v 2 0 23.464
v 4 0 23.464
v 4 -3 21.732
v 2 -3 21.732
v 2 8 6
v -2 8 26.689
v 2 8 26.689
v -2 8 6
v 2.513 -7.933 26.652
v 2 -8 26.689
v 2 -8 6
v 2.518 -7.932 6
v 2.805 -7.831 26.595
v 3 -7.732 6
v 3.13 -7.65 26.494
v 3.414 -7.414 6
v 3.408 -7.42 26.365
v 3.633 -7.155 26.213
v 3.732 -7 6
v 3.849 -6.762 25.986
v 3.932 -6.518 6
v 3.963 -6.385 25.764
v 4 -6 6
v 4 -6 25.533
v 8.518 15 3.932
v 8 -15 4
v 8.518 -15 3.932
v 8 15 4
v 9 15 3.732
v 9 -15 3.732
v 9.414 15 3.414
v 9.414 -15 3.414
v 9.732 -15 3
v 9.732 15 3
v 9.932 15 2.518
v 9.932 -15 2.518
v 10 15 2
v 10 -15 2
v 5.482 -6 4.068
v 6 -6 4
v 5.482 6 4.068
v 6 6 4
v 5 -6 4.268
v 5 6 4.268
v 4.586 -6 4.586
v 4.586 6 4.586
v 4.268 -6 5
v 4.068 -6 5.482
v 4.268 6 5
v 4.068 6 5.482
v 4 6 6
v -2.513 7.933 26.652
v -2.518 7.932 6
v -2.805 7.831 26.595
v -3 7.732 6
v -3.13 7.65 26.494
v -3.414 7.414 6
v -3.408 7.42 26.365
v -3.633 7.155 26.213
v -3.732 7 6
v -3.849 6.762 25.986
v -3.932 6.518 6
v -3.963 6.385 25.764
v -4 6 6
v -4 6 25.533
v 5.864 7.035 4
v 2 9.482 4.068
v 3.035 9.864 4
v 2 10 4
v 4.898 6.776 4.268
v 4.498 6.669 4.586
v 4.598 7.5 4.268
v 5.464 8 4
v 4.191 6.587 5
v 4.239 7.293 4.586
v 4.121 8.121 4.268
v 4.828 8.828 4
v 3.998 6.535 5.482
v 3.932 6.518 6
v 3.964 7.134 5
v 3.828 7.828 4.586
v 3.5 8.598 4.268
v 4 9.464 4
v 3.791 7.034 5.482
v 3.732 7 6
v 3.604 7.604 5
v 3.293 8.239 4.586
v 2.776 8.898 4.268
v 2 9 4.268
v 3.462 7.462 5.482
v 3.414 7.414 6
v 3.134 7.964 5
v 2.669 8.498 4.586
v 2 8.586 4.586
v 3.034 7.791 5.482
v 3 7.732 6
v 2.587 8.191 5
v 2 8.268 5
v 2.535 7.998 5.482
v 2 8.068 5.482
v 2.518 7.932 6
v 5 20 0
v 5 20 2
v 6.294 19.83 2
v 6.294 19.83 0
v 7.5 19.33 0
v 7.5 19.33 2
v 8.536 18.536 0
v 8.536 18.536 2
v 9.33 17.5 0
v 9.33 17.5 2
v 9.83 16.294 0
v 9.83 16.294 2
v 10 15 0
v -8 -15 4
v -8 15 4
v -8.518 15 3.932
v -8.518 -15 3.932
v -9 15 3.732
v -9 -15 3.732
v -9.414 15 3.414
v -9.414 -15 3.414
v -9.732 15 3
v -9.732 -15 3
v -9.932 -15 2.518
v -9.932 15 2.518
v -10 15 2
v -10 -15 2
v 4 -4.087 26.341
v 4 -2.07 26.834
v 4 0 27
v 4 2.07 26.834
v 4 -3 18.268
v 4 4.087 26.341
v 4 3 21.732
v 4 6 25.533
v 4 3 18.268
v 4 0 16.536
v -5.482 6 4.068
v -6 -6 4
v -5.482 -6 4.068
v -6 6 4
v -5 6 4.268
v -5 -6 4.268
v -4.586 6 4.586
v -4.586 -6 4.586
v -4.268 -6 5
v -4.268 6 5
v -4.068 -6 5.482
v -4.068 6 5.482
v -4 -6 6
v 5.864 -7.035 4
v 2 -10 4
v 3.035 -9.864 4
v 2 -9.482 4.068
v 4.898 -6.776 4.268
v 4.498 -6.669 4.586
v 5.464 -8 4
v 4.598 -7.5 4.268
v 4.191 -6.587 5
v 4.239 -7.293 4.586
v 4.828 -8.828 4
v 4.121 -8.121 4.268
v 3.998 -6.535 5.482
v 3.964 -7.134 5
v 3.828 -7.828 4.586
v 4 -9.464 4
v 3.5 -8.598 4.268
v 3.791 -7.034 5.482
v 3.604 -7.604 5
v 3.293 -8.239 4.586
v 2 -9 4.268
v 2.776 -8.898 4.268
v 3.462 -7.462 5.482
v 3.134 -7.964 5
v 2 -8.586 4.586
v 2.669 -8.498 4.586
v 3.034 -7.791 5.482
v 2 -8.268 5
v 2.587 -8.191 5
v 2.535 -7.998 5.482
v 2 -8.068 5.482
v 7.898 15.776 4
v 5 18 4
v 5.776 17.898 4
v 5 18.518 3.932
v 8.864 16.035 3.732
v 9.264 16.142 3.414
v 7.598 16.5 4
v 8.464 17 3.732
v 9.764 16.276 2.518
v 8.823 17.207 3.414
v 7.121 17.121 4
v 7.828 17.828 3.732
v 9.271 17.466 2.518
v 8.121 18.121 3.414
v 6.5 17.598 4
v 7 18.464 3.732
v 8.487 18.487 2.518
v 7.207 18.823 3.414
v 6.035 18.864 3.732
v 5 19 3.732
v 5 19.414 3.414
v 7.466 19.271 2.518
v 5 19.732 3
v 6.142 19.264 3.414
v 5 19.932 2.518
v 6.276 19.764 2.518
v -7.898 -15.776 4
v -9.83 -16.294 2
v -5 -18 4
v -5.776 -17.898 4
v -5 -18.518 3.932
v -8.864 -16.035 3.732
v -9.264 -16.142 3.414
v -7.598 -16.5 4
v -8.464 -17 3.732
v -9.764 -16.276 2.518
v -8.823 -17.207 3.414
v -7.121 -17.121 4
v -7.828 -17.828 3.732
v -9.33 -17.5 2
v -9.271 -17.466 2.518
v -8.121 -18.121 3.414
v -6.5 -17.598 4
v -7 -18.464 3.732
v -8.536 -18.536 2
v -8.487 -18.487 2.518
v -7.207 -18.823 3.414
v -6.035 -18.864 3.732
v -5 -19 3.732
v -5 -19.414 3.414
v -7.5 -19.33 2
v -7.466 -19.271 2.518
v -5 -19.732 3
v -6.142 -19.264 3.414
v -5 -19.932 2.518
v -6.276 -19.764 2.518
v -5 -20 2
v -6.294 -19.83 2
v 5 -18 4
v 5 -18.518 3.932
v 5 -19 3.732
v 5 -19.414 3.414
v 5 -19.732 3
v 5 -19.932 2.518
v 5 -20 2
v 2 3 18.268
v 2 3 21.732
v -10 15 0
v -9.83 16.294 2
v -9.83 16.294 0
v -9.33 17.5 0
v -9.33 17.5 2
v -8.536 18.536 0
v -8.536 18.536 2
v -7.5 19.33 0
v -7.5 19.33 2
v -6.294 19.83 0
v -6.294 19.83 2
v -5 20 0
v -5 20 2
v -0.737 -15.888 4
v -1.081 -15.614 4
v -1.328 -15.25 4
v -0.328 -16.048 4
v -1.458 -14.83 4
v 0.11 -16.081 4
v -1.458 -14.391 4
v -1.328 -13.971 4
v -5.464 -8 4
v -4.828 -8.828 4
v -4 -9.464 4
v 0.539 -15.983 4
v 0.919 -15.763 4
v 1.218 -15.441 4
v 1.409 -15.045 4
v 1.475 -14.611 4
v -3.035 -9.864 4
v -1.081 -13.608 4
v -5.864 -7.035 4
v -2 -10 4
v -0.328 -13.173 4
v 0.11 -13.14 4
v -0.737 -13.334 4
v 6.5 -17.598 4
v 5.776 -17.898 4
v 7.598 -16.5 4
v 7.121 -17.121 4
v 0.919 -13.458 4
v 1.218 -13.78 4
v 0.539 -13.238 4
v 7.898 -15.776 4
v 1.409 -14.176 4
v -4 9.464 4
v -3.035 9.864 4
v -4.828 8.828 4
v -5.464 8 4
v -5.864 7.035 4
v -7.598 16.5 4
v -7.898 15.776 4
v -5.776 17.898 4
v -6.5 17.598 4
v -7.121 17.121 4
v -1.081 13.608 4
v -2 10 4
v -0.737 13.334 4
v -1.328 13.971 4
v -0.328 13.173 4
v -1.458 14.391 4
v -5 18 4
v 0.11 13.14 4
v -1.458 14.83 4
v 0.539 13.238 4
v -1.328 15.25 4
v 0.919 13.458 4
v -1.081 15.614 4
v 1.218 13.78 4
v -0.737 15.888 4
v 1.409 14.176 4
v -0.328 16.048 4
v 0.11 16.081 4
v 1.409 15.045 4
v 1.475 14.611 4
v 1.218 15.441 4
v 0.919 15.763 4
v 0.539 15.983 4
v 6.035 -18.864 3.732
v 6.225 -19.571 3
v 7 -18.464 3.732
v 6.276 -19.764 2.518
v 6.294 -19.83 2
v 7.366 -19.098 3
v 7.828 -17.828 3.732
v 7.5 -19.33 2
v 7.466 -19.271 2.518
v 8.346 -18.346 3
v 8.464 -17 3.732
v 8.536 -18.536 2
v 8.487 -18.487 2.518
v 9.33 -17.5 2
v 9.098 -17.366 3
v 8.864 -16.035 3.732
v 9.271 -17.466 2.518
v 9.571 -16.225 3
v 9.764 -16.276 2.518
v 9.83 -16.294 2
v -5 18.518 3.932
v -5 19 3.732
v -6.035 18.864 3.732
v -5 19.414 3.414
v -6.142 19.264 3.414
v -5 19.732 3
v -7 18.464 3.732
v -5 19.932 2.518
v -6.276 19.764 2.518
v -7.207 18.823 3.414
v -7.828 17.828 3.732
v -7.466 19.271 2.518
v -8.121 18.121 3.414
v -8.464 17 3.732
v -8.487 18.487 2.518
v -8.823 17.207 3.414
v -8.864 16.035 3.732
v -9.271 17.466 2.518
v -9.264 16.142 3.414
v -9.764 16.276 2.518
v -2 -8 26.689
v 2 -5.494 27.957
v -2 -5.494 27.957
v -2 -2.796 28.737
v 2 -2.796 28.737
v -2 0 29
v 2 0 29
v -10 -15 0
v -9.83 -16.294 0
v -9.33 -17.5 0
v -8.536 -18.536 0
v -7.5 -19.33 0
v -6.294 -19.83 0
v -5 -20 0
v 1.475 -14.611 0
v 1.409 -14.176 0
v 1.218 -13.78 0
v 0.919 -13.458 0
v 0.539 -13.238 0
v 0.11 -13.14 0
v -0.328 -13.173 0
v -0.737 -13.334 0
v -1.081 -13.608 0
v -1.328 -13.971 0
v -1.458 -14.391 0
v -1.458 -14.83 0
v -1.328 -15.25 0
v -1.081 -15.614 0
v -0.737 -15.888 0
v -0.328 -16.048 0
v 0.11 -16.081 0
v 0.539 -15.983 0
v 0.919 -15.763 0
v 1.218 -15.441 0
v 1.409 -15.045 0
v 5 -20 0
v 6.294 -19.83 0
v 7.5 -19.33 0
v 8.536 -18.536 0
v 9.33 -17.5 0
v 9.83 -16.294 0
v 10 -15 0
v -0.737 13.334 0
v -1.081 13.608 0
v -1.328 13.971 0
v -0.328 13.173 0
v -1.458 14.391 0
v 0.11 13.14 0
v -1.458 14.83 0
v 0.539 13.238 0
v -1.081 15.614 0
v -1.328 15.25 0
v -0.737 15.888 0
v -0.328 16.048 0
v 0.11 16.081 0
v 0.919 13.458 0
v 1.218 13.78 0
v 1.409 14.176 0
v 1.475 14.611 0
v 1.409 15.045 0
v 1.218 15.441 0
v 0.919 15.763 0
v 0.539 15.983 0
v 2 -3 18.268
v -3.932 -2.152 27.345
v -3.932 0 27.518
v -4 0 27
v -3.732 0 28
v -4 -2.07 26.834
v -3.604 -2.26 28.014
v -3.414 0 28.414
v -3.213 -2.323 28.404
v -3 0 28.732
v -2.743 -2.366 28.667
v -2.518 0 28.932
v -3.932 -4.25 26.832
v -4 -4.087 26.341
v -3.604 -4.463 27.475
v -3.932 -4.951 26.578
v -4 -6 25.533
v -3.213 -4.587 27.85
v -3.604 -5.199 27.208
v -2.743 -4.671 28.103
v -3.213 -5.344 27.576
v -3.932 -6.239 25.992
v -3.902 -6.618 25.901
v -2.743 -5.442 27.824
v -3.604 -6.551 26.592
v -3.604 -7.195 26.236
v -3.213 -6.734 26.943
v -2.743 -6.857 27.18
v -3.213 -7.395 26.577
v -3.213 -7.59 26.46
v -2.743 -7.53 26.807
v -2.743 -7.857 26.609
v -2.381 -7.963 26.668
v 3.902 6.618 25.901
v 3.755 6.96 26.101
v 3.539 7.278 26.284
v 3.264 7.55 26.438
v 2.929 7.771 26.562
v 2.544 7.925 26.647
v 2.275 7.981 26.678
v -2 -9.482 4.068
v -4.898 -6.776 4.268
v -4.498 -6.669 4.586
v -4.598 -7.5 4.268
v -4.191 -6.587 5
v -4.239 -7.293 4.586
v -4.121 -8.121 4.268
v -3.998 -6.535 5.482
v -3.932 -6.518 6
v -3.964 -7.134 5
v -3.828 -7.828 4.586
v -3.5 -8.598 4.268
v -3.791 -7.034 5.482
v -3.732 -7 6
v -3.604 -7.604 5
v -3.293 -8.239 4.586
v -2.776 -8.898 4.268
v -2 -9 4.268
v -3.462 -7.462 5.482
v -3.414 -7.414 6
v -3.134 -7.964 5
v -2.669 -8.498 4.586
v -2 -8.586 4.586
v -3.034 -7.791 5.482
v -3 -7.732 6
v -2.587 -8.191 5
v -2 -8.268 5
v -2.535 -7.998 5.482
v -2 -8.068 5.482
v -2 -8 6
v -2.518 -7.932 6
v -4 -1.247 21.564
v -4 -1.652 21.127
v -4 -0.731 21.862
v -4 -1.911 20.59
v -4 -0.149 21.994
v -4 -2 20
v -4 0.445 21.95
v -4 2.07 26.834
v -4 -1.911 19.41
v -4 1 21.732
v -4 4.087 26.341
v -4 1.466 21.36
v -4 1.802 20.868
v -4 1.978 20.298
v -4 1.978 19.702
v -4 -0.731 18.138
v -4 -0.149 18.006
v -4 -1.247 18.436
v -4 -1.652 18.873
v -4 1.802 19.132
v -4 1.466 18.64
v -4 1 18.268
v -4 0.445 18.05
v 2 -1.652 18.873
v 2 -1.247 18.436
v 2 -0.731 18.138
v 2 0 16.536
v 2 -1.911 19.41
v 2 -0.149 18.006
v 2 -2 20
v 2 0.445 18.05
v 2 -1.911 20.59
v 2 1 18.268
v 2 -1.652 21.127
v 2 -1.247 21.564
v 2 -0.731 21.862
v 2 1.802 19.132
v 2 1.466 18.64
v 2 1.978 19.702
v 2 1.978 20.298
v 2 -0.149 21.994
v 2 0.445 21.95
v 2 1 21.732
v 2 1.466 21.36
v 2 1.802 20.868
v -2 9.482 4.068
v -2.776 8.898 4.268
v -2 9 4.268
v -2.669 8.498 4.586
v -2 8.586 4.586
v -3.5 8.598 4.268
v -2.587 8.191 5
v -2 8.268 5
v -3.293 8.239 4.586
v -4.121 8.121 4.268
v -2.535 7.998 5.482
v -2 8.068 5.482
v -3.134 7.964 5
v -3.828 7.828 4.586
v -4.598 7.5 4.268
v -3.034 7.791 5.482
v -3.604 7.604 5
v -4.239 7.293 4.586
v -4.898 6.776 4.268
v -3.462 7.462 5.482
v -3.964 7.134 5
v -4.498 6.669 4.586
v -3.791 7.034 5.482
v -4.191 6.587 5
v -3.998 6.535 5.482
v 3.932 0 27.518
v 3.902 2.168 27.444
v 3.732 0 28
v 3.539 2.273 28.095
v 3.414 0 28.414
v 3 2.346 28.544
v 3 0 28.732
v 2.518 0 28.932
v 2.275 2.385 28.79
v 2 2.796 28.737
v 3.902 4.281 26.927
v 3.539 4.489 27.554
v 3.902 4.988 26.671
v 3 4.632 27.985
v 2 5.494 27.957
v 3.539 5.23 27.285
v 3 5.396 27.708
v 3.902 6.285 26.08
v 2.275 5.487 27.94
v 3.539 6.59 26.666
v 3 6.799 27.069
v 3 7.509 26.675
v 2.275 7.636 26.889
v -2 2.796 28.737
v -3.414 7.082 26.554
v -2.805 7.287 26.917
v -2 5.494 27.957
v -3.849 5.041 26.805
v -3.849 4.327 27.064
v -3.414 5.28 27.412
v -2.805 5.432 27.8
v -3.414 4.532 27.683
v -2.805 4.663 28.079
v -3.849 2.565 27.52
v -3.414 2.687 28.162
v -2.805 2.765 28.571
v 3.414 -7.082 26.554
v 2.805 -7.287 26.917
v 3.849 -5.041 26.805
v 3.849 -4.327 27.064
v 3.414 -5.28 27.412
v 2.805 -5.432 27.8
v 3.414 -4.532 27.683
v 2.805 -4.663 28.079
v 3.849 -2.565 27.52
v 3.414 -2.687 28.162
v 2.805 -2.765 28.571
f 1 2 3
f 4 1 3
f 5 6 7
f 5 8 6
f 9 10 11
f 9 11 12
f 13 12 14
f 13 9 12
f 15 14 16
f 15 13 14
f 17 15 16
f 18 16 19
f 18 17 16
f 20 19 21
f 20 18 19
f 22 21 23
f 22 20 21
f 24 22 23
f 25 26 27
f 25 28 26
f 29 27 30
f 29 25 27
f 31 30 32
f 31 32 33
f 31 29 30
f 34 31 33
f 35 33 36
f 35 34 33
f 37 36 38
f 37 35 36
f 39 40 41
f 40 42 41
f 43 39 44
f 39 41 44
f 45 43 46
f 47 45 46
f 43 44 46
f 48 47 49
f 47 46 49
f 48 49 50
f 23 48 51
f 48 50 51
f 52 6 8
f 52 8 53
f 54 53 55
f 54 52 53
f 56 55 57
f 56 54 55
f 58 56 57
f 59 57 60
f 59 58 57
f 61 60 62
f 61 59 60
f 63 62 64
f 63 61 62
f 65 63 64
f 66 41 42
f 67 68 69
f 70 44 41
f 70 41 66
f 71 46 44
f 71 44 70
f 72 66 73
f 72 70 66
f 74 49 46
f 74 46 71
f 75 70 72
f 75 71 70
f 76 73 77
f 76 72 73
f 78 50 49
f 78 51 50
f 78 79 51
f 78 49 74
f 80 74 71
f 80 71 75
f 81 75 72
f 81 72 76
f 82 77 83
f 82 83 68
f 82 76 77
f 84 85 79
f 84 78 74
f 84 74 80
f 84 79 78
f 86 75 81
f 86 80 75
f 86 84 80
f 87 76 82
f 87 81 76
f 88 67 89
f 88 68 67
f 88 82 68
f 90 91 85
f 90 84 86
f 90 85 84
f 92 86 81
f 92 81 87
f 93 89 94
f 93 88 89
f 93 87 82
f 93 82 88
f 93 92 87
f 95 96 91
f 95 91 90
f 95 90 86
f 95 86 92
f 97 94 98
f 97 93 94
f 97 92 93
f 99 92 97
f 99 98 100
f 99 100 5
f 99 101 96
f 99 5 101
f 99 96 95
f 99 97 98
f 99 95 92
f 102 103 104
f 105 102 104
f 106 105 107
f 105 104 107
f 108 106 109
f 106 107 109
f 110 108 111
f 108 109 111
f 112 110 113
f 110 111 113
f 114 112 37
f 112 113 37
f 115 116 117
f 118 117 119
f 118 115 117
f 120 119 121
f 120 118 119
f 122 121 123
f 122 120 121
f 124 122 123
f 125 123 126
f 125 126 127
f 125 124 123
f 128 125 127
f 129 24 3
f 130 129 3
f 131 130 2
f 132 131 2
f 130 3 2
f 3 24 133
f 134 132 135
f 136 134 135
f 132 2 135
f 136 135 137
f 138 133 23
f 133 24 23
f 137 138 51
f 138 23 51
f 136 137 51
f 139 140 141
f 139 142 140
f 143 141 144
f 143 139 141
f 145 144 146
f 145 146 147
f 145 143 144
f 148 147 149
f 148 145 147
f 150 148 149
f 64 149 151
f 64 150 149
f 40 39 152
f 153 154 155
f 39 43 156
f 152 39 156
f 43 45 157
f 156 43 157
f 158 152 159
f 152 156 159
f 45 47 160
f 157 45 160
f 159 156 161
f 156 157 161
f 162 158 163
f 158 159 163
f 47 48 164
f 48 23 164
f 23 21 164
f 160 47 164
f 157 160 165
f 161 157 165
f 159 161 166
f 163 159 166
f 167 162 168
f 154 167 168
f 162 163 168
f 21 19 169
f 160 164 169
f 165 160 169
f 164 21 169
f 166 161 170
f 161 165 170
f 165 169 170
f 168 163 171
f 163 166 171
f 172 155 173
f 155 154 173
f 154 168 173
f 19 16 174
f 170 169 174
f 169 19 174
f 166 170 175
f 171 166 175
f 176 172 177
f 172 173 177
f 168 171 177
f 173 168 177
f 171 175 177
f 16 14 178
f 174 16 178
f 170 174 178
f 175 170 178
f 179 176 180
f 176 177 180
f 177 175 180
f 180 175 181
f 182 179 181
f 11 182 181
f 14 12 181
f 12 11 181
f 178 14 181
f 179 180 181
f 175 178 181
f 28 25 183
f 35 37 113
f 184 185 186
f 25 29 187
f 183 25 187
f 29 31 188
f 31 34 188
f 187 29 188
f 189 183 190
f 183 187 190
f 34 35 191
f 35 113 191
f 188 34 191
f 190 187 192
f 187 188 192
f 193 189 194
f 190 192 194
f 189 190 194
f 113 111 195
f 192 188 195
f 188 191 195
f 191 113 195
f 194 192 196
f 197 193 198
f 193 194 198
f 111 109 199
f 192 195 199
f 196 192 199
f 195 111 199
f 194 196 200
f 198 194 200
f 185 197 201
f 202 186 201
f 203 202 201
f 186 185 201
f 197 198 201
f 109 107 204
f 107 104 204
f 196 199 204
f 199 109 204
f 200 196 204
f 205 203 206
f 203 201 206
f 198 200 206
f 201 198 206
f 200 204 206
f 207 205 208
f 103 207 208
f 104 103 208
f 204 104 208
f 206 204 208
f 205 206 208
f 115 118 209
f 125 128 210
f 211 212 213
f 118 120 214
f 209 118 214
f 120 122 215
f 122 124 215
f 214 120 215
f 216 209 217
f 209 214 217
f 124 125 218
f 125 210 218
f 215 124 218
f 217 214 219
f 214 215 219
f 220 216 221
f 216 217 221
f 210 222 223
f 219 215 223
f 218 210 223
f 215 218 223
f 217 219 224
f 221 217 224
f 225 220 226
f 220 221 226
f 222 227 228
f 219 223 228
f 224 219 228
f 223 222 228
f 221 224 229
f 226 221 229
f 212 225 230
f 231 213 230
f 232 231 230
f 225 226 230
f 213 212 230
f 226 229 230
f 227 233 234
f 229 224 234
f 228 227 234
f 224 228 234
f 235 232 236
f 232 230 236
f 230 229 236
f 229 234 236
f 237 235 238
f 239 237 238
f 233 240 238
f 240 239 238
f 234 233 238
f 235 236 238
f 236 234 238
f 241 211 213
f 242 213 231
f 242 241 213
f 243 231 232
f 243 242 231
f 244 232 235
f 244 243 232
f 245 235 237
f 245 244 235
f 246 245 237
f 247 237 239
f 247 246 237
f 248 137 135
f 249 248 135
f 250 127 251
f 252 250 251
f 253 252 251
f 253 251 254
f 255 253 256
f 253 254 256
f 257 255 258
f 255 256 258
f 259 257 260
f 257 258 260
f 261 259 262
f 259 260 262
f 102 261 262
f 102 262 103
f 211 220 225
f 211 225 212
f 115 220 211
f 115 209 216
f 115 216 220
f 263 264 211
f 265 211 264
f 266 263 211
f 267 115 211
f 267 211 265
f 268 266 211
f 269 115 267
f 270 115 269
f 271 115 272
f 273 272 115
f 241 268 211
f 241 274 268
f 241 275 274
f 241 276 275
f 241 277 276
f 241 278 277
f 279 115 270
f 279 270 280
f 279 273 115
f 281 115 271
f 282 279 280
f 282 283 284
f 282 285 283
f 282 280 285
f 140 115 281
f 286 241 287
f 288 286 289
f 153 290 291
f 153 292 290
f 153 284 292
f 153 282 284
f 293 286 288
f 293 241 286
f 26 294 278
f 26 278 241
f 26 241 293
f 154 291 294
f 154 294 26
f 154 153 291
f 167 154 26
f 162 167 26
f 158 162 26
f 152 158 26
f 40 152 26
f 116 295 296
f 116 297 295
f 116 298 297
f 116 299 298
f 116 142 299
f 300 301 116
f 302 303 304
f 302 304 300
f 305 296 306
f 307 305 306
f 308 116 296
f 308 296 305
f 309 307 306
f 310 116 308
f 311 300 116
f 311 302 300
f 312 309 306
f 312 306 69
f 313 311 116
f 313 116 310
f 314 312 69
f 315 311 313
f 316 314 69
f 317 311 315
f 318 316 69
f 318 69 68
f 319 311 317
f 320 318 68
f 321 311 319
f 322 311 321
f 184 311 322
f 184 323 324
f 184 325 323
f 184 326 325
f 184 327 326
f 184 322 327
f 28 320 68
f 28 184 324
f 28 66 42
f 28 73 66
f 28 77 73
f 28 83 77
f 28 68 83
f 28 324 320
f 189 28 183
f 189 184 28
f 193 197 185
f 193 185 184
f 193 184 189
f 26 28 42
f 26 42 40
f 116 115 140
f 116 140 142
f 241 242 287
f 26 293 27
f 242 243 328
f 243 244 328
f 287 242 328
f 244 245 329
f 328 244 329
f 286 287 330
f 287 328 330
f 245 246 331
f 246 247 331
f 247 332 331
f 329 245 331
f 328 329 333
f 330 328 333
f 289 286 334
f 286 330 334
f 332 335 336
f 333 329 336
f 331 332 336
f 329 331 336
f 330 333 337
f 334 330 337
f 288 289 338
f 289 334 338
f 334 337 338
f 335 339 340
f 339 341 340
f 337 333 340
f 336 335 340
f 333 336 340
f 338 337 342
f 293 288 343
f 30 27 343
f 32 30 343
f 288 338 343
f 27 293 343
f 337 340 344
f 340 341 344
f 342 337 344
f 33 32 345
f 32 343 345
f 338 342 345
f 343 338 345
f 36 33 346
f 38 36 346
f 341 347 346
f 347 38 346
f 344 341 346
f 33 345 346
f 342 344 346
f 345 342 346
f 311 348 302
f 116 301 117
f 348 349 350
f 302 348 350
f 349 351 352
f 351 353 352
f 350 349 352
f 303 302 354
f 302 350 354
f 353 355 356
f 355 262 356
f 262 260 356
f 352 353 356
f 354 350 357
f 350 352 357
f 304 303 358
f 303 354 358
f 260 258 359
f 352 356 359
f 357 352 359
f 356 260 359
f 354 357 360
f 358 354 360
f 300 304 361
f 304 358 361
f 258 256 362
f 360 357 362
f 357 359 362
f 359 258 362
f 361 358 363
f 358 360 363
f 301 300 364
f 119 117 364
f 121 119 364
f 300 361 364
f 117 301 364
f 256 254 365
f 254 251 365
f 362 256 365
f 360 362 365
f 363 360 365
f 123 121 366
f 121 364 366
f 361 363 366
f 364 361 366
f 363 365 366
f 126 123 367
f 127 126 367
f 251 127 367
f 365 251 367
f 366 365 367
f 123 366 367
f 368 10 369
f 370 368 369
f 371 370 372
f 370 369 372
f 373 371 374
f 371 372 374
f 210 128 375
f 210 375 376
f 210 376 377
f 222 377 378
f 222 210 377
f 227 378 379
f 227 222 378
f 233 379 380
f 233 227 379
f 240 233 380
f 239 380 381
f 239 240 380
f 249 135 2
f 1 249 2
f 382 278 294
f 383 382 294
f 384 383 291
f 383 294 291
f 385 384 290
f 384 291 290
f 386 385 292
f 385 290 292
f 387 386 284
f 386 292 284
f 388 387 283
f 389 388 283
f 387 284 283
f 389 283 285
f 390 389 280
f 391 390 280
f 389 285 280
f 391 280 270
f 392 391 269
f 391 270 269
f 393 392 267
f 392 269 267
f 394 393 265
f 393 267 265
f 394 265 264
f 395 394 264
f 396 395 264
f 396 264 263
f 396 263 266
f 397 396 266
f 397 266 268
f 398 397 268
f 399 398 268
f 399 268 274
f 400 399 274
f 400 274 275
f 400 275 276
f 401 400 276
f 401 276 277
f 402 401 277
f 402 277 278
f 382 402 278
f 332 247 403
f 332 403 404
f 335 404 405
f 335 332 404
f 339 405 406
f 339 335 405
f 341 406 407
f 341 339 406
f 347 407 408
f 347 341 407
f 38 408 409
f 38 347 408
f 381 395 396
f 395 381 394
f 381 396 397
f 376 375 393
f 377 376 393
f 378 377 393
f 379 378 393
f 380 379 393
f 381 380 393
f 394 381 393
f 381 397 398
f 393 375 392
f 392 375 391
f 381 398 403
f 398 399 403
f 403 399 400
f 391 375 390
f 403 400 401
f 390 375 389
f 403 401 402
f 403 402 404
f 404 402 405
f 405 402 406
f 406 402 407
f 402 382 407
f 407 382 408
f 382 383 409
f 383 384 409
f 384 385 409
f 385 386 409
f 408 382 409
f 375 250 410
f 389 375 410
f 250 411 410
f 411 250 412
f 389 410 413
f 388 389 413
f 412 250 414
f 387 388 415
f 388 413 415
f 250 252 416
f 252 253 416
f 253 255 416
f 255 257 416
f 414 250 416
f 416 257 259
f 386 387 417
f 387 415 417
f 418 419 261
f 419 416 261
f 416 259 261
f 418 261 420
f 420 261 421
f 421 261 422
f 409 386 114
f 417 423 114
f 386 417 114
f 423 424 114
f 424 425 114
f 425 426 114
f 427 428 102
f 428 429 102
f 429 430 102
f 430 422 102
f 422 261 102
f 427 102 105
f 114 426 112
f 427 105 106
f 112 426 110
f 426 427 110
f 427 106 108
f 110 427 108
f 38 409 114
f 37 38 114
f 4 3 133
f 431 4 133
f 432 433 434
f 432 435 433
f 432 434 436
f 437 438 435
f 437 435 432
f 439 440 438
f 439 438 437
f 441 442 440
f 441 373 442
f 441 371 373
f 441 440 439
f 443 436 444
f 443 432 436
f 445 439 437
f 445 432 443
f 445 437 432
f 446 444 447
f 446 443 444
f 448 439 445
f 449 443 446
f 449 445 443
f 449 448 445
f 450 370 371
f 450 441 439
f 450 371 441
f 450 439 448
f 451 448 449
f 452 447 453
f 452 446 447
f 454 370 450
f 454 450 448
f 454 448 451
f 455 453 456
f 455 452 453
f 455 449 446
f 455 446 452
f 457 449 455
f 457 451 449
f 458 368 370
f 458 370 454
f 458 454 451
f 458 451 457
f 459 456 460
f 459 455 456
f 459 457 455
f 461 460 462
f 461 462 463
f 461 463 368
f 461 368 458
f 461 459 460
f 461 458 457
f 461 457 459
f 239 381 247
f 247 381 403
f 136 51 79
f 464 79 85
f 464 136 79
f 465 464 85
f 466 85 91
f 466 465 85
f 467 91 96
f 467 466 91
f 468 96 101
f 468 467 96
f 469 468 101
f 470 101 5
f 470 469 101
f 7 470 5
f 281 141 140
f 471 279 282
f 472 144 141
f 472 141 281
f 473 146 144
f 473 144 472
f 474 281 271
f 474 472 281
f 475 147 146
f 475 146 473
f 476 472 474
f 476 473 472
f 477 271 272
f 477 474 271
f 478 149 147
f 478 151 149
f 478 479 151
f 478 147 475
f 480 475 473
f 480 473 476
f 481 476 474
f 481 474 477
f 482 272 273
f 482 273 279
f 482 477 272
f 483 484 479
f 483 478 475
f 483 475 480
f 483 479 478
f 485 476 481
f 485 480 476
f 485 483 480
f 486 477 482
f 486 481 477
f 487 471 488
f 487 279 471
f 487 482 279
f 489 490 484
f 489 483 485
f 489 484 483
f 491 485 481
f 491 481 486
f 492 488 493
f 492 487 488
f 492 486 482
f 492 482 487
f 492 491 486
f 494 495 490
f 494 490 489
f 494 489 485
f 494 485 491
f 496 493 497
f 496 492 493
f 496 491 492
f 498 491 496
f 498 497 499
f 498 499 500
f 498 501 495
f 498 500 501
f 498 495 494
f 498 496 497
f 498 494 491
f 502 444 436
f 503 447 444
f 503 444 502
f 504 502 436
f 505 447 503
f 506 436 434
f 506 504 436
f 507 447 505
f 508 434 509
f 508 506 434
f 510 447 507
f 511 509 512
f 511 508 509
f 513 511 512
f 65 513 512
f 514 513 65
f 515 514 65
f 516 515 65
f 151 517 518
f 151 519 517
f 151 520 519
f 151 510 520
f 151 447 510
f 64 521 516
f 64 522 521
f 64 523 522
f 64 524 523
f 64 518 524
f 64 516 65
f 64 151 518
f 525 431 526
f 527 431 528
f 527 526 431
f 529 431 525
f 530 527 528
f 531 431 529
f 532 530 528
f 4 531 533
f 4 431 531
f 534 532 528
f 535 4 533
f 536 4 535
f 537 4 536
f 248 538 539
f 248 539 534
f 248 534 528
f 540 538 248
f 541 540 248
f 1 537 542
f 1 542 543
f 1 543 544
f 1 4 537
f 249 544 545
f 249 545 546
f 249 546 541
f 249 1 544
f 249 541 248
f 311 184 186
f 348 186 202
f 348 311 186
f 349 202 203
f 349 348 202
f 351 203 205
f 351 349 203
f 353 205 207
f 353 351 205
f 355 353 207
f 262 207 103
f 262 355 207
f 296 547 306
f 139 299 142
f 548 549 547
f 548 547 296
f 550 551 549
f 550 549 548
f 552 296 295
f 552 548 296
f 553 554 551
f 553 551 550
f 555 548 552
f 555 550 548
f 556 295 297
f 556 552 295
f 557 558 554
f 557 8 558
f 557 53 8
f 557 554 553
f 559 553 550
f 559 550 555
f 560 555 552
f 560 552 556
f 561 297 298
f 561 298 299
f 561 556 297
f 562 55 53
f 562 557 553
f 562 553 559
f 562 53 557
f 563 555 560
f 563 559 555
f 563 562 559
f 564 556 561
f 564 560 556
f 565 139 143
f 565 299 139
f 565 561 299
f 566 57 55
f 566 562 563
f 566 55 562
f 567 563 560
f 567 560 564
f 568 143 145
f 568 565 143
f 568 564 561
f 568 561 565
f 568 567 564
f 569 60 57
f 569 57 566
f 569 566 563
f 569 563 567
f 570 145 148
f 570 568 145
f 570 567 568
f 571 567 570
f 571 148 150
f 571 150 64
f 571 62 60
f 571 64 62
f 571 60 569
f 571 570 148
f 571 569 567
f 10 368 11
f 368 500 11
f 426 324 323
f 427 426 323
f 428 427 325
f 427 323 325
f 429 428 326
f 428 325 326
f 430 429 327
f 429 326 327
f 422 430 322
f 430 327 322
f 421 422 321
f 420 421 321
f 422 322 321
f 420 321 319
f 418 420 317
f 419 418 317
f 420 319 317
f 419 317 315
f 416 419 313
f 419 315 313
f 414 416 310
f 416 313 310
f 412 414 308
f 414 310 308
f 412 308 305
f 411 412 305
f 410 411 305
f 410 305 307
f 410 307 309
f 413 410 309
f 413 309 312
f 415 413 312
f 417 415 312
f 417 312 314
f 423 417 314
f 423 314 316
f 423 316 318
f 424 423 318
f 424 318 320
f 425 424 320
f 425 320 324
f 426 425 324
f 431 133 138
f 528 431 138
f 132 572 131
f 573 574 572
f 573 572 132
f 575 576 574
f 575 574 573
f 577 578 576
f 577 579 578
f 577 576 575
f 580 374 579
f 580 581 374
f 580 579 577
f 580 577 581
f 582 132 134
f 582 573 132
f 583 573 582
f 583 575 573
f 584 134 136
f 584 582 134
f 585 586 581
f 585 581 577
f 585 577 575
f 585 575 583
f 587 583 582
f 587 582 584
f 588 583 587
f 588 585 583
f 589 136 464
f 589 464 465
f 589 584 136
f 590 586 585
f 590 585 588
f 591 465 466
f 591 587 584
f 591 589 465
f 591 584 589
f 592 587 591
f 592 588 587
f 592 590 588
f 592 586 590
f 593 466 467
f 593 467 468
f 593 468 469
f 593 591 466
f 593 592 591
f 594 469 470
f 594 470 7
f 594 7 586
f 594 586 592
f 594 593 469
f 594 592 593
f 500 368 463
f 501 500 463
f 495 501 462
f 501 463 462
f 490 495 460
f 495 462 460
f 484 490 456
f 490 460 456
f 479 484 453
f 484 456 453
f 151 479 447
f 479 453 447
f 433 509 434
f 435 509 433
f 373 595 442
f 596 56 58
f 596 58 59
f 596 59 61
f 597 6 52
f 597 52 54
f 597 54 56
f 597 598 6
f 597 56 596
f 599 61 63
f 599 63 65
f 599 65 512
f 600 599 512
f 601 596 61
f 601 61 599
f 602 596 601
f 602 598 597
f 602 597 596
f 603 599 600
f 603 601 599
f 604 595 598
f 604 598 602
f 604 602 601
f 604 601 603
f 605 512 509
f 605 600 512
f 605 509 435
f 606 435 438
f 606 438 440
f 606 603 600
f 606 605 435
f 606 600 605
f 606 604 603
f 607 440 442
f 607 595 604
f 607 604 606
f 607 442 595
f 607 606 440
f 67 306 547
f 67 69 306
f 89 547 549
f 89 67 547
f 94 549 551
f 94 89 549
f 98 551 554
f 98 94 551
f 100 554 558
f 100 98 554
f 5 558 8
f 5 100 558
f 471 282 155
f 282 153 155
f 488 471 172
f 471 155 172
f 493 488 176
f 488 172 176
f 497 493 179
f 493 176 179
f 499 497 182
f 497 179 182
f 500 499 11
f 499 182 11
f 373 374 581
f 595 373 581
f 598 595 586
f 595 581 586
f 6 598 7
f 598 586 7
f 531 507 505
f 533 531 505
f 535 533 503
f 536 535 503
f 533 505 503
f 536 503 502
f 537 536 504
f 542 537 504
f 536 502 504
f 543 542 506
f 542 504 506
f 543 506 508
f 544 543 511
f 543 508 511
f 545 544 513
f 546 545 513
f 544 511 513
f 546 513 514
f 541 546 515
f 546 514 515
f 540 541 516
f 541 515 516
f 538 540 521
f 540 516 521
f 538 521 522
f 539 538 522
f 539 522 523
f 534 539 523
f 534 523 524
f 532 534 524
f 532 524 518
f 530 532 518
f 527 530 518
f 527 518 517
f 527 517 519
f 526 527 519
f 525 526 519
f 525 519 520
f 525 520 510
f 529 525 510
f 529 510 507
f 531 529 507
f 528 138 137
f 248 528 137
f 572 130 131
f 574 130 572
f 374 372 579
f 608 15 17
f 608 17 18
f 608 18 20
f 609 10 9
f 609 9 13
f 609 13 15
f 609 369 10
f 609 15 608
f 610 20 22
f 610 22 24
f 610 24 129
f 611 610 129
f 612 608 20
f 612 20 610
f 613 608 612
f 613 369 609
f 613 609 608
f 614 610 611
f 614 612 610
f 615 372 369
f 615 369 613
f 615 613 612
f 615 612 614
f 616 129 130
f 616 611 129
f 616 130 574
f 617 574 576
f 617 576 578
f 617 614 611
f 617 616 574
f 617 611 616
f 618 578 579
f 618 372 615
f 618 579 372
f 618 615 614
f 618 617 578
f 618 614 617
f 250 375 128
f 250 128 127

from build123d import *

# Parameters (mm, degrees)
F0_W      = 20
F0_H      = 40
F1_DEPTH  = 4
F2_W      = 8
F2_H      = 16
F3_DEPTH  = 25
F5_DEPTH  = 25
F6_R      = 5
F7_R      = 2
F8_R      = 2
F9_DEPTH  = 25
F10_R     = 1.4745216426
F11_DEPTH = 5
F13_DEPTH = 2


with BuildPart() as f1:
    # F0 (on Top) → F1 (new body)
    with BuildSketch(Plane.XY):
        Rectangle(F0_W, F0_H)
    extrude(amount=F1_DEPTH)

    # F2 (on face) → F3 (join)
    with BuildSketch(Plane.XY.offset(4)):
        Rectangle(F2_W, F2_H)
    extrude(amount=F3_DEPTH)

    # F4 (on face) → F5 (cut)
    with BuildSketch(Plane.YZ.offset(4)):
        with BuildLine():
            Line((-8, 29), (-8, 26.6885775404))
            ThreePointArc((-8, 26.6885775404), (-4.1636124275, 28.4105631935), (0, 29))
            Line((0, 29), (-8, 29))
        make_face()
        with BuildLine():
            ThreePointArc((0, 29), (4.1636124275, 28.4105631935), (8, 26.6885775404))
            Line((8, 26.6885775405), (8, 29))
            Line((8, 29), (0, 29))
        make_face()
    extrude(amount=-F5_DEPTH, mode=Mode.SUBTRACT)

    # F6
    f6_edges = [f1.edges().sort_by_distance(p)[0] for p in [
        (-10, 20, 2),
        (-10, -20, 2),
        (10, -20, 2),
        (10, 20, 2),
    ]]
    fillet(f6_edges, radius=F6_R)

    # F7
    f7_edges = [f1.edges().sort_by_distance(p)[0] for p in [
        (10, 0, 4),
        (8.535534, -18.535534, 4),
        (8.535534, 18.535534, 4),
        (0, -20, 4),
        (0, 20, 4),
        (-8.535534, -18.535534, 4),
        (-8.535534, 18.535534, 4),
        (-10, 0, 4),
        (4, 0, 4),
        (0, 8, 4),
        (-4, 0, 4),
        (0, -8, 4),
        (4, -8, 15.344289),
        (4, 0, 29),
        (4, 8, 15.344289),
        (-4, 8, 15.344289),
        (-4, 0, 29),
        (-4, -8, 15.344289),
    ]]
    fillet(f7_edges, radius=F7_R)

    # F8 (on face) → F9 (cut)
    with BuildSketch(Plane(origin=(-4, 0, 0), x_dir=(0, -1, 0), z_dir=(-1, 0, 0))):
        with Locations((0, 20)):
            Circle(F8_R)
    extrude(amount=-F9_DEPTH, mode=Mode.SUBTRACT)

    # F10 (on face) → F11 (cut)
    with BuildSketch(Plane.XY.offset(4)):
        with Locations((0, 14.610607177)):
            Circle(F10_R)
        with Locations((0, -14.610607177)):
            Circle(F10_R)
    extrude(amount=-F11_DEPTH, mode=Mode.SUBTRACT)

    # F12 (on face) → F13 (cut)
    with BuildSketch(Plane.YZ.offset(4)):
        Polygon((3, 21.7320508076), (0, 23.4641016151), (-3, 21.7320508076), (-3, 18.2679491924), (0, 16.5358983849), (3, 18.2679491924), align=None)
    extrude(amount=-F13_DEPTH, mode=Mode.SUBTRACT)


solid = f1.part
